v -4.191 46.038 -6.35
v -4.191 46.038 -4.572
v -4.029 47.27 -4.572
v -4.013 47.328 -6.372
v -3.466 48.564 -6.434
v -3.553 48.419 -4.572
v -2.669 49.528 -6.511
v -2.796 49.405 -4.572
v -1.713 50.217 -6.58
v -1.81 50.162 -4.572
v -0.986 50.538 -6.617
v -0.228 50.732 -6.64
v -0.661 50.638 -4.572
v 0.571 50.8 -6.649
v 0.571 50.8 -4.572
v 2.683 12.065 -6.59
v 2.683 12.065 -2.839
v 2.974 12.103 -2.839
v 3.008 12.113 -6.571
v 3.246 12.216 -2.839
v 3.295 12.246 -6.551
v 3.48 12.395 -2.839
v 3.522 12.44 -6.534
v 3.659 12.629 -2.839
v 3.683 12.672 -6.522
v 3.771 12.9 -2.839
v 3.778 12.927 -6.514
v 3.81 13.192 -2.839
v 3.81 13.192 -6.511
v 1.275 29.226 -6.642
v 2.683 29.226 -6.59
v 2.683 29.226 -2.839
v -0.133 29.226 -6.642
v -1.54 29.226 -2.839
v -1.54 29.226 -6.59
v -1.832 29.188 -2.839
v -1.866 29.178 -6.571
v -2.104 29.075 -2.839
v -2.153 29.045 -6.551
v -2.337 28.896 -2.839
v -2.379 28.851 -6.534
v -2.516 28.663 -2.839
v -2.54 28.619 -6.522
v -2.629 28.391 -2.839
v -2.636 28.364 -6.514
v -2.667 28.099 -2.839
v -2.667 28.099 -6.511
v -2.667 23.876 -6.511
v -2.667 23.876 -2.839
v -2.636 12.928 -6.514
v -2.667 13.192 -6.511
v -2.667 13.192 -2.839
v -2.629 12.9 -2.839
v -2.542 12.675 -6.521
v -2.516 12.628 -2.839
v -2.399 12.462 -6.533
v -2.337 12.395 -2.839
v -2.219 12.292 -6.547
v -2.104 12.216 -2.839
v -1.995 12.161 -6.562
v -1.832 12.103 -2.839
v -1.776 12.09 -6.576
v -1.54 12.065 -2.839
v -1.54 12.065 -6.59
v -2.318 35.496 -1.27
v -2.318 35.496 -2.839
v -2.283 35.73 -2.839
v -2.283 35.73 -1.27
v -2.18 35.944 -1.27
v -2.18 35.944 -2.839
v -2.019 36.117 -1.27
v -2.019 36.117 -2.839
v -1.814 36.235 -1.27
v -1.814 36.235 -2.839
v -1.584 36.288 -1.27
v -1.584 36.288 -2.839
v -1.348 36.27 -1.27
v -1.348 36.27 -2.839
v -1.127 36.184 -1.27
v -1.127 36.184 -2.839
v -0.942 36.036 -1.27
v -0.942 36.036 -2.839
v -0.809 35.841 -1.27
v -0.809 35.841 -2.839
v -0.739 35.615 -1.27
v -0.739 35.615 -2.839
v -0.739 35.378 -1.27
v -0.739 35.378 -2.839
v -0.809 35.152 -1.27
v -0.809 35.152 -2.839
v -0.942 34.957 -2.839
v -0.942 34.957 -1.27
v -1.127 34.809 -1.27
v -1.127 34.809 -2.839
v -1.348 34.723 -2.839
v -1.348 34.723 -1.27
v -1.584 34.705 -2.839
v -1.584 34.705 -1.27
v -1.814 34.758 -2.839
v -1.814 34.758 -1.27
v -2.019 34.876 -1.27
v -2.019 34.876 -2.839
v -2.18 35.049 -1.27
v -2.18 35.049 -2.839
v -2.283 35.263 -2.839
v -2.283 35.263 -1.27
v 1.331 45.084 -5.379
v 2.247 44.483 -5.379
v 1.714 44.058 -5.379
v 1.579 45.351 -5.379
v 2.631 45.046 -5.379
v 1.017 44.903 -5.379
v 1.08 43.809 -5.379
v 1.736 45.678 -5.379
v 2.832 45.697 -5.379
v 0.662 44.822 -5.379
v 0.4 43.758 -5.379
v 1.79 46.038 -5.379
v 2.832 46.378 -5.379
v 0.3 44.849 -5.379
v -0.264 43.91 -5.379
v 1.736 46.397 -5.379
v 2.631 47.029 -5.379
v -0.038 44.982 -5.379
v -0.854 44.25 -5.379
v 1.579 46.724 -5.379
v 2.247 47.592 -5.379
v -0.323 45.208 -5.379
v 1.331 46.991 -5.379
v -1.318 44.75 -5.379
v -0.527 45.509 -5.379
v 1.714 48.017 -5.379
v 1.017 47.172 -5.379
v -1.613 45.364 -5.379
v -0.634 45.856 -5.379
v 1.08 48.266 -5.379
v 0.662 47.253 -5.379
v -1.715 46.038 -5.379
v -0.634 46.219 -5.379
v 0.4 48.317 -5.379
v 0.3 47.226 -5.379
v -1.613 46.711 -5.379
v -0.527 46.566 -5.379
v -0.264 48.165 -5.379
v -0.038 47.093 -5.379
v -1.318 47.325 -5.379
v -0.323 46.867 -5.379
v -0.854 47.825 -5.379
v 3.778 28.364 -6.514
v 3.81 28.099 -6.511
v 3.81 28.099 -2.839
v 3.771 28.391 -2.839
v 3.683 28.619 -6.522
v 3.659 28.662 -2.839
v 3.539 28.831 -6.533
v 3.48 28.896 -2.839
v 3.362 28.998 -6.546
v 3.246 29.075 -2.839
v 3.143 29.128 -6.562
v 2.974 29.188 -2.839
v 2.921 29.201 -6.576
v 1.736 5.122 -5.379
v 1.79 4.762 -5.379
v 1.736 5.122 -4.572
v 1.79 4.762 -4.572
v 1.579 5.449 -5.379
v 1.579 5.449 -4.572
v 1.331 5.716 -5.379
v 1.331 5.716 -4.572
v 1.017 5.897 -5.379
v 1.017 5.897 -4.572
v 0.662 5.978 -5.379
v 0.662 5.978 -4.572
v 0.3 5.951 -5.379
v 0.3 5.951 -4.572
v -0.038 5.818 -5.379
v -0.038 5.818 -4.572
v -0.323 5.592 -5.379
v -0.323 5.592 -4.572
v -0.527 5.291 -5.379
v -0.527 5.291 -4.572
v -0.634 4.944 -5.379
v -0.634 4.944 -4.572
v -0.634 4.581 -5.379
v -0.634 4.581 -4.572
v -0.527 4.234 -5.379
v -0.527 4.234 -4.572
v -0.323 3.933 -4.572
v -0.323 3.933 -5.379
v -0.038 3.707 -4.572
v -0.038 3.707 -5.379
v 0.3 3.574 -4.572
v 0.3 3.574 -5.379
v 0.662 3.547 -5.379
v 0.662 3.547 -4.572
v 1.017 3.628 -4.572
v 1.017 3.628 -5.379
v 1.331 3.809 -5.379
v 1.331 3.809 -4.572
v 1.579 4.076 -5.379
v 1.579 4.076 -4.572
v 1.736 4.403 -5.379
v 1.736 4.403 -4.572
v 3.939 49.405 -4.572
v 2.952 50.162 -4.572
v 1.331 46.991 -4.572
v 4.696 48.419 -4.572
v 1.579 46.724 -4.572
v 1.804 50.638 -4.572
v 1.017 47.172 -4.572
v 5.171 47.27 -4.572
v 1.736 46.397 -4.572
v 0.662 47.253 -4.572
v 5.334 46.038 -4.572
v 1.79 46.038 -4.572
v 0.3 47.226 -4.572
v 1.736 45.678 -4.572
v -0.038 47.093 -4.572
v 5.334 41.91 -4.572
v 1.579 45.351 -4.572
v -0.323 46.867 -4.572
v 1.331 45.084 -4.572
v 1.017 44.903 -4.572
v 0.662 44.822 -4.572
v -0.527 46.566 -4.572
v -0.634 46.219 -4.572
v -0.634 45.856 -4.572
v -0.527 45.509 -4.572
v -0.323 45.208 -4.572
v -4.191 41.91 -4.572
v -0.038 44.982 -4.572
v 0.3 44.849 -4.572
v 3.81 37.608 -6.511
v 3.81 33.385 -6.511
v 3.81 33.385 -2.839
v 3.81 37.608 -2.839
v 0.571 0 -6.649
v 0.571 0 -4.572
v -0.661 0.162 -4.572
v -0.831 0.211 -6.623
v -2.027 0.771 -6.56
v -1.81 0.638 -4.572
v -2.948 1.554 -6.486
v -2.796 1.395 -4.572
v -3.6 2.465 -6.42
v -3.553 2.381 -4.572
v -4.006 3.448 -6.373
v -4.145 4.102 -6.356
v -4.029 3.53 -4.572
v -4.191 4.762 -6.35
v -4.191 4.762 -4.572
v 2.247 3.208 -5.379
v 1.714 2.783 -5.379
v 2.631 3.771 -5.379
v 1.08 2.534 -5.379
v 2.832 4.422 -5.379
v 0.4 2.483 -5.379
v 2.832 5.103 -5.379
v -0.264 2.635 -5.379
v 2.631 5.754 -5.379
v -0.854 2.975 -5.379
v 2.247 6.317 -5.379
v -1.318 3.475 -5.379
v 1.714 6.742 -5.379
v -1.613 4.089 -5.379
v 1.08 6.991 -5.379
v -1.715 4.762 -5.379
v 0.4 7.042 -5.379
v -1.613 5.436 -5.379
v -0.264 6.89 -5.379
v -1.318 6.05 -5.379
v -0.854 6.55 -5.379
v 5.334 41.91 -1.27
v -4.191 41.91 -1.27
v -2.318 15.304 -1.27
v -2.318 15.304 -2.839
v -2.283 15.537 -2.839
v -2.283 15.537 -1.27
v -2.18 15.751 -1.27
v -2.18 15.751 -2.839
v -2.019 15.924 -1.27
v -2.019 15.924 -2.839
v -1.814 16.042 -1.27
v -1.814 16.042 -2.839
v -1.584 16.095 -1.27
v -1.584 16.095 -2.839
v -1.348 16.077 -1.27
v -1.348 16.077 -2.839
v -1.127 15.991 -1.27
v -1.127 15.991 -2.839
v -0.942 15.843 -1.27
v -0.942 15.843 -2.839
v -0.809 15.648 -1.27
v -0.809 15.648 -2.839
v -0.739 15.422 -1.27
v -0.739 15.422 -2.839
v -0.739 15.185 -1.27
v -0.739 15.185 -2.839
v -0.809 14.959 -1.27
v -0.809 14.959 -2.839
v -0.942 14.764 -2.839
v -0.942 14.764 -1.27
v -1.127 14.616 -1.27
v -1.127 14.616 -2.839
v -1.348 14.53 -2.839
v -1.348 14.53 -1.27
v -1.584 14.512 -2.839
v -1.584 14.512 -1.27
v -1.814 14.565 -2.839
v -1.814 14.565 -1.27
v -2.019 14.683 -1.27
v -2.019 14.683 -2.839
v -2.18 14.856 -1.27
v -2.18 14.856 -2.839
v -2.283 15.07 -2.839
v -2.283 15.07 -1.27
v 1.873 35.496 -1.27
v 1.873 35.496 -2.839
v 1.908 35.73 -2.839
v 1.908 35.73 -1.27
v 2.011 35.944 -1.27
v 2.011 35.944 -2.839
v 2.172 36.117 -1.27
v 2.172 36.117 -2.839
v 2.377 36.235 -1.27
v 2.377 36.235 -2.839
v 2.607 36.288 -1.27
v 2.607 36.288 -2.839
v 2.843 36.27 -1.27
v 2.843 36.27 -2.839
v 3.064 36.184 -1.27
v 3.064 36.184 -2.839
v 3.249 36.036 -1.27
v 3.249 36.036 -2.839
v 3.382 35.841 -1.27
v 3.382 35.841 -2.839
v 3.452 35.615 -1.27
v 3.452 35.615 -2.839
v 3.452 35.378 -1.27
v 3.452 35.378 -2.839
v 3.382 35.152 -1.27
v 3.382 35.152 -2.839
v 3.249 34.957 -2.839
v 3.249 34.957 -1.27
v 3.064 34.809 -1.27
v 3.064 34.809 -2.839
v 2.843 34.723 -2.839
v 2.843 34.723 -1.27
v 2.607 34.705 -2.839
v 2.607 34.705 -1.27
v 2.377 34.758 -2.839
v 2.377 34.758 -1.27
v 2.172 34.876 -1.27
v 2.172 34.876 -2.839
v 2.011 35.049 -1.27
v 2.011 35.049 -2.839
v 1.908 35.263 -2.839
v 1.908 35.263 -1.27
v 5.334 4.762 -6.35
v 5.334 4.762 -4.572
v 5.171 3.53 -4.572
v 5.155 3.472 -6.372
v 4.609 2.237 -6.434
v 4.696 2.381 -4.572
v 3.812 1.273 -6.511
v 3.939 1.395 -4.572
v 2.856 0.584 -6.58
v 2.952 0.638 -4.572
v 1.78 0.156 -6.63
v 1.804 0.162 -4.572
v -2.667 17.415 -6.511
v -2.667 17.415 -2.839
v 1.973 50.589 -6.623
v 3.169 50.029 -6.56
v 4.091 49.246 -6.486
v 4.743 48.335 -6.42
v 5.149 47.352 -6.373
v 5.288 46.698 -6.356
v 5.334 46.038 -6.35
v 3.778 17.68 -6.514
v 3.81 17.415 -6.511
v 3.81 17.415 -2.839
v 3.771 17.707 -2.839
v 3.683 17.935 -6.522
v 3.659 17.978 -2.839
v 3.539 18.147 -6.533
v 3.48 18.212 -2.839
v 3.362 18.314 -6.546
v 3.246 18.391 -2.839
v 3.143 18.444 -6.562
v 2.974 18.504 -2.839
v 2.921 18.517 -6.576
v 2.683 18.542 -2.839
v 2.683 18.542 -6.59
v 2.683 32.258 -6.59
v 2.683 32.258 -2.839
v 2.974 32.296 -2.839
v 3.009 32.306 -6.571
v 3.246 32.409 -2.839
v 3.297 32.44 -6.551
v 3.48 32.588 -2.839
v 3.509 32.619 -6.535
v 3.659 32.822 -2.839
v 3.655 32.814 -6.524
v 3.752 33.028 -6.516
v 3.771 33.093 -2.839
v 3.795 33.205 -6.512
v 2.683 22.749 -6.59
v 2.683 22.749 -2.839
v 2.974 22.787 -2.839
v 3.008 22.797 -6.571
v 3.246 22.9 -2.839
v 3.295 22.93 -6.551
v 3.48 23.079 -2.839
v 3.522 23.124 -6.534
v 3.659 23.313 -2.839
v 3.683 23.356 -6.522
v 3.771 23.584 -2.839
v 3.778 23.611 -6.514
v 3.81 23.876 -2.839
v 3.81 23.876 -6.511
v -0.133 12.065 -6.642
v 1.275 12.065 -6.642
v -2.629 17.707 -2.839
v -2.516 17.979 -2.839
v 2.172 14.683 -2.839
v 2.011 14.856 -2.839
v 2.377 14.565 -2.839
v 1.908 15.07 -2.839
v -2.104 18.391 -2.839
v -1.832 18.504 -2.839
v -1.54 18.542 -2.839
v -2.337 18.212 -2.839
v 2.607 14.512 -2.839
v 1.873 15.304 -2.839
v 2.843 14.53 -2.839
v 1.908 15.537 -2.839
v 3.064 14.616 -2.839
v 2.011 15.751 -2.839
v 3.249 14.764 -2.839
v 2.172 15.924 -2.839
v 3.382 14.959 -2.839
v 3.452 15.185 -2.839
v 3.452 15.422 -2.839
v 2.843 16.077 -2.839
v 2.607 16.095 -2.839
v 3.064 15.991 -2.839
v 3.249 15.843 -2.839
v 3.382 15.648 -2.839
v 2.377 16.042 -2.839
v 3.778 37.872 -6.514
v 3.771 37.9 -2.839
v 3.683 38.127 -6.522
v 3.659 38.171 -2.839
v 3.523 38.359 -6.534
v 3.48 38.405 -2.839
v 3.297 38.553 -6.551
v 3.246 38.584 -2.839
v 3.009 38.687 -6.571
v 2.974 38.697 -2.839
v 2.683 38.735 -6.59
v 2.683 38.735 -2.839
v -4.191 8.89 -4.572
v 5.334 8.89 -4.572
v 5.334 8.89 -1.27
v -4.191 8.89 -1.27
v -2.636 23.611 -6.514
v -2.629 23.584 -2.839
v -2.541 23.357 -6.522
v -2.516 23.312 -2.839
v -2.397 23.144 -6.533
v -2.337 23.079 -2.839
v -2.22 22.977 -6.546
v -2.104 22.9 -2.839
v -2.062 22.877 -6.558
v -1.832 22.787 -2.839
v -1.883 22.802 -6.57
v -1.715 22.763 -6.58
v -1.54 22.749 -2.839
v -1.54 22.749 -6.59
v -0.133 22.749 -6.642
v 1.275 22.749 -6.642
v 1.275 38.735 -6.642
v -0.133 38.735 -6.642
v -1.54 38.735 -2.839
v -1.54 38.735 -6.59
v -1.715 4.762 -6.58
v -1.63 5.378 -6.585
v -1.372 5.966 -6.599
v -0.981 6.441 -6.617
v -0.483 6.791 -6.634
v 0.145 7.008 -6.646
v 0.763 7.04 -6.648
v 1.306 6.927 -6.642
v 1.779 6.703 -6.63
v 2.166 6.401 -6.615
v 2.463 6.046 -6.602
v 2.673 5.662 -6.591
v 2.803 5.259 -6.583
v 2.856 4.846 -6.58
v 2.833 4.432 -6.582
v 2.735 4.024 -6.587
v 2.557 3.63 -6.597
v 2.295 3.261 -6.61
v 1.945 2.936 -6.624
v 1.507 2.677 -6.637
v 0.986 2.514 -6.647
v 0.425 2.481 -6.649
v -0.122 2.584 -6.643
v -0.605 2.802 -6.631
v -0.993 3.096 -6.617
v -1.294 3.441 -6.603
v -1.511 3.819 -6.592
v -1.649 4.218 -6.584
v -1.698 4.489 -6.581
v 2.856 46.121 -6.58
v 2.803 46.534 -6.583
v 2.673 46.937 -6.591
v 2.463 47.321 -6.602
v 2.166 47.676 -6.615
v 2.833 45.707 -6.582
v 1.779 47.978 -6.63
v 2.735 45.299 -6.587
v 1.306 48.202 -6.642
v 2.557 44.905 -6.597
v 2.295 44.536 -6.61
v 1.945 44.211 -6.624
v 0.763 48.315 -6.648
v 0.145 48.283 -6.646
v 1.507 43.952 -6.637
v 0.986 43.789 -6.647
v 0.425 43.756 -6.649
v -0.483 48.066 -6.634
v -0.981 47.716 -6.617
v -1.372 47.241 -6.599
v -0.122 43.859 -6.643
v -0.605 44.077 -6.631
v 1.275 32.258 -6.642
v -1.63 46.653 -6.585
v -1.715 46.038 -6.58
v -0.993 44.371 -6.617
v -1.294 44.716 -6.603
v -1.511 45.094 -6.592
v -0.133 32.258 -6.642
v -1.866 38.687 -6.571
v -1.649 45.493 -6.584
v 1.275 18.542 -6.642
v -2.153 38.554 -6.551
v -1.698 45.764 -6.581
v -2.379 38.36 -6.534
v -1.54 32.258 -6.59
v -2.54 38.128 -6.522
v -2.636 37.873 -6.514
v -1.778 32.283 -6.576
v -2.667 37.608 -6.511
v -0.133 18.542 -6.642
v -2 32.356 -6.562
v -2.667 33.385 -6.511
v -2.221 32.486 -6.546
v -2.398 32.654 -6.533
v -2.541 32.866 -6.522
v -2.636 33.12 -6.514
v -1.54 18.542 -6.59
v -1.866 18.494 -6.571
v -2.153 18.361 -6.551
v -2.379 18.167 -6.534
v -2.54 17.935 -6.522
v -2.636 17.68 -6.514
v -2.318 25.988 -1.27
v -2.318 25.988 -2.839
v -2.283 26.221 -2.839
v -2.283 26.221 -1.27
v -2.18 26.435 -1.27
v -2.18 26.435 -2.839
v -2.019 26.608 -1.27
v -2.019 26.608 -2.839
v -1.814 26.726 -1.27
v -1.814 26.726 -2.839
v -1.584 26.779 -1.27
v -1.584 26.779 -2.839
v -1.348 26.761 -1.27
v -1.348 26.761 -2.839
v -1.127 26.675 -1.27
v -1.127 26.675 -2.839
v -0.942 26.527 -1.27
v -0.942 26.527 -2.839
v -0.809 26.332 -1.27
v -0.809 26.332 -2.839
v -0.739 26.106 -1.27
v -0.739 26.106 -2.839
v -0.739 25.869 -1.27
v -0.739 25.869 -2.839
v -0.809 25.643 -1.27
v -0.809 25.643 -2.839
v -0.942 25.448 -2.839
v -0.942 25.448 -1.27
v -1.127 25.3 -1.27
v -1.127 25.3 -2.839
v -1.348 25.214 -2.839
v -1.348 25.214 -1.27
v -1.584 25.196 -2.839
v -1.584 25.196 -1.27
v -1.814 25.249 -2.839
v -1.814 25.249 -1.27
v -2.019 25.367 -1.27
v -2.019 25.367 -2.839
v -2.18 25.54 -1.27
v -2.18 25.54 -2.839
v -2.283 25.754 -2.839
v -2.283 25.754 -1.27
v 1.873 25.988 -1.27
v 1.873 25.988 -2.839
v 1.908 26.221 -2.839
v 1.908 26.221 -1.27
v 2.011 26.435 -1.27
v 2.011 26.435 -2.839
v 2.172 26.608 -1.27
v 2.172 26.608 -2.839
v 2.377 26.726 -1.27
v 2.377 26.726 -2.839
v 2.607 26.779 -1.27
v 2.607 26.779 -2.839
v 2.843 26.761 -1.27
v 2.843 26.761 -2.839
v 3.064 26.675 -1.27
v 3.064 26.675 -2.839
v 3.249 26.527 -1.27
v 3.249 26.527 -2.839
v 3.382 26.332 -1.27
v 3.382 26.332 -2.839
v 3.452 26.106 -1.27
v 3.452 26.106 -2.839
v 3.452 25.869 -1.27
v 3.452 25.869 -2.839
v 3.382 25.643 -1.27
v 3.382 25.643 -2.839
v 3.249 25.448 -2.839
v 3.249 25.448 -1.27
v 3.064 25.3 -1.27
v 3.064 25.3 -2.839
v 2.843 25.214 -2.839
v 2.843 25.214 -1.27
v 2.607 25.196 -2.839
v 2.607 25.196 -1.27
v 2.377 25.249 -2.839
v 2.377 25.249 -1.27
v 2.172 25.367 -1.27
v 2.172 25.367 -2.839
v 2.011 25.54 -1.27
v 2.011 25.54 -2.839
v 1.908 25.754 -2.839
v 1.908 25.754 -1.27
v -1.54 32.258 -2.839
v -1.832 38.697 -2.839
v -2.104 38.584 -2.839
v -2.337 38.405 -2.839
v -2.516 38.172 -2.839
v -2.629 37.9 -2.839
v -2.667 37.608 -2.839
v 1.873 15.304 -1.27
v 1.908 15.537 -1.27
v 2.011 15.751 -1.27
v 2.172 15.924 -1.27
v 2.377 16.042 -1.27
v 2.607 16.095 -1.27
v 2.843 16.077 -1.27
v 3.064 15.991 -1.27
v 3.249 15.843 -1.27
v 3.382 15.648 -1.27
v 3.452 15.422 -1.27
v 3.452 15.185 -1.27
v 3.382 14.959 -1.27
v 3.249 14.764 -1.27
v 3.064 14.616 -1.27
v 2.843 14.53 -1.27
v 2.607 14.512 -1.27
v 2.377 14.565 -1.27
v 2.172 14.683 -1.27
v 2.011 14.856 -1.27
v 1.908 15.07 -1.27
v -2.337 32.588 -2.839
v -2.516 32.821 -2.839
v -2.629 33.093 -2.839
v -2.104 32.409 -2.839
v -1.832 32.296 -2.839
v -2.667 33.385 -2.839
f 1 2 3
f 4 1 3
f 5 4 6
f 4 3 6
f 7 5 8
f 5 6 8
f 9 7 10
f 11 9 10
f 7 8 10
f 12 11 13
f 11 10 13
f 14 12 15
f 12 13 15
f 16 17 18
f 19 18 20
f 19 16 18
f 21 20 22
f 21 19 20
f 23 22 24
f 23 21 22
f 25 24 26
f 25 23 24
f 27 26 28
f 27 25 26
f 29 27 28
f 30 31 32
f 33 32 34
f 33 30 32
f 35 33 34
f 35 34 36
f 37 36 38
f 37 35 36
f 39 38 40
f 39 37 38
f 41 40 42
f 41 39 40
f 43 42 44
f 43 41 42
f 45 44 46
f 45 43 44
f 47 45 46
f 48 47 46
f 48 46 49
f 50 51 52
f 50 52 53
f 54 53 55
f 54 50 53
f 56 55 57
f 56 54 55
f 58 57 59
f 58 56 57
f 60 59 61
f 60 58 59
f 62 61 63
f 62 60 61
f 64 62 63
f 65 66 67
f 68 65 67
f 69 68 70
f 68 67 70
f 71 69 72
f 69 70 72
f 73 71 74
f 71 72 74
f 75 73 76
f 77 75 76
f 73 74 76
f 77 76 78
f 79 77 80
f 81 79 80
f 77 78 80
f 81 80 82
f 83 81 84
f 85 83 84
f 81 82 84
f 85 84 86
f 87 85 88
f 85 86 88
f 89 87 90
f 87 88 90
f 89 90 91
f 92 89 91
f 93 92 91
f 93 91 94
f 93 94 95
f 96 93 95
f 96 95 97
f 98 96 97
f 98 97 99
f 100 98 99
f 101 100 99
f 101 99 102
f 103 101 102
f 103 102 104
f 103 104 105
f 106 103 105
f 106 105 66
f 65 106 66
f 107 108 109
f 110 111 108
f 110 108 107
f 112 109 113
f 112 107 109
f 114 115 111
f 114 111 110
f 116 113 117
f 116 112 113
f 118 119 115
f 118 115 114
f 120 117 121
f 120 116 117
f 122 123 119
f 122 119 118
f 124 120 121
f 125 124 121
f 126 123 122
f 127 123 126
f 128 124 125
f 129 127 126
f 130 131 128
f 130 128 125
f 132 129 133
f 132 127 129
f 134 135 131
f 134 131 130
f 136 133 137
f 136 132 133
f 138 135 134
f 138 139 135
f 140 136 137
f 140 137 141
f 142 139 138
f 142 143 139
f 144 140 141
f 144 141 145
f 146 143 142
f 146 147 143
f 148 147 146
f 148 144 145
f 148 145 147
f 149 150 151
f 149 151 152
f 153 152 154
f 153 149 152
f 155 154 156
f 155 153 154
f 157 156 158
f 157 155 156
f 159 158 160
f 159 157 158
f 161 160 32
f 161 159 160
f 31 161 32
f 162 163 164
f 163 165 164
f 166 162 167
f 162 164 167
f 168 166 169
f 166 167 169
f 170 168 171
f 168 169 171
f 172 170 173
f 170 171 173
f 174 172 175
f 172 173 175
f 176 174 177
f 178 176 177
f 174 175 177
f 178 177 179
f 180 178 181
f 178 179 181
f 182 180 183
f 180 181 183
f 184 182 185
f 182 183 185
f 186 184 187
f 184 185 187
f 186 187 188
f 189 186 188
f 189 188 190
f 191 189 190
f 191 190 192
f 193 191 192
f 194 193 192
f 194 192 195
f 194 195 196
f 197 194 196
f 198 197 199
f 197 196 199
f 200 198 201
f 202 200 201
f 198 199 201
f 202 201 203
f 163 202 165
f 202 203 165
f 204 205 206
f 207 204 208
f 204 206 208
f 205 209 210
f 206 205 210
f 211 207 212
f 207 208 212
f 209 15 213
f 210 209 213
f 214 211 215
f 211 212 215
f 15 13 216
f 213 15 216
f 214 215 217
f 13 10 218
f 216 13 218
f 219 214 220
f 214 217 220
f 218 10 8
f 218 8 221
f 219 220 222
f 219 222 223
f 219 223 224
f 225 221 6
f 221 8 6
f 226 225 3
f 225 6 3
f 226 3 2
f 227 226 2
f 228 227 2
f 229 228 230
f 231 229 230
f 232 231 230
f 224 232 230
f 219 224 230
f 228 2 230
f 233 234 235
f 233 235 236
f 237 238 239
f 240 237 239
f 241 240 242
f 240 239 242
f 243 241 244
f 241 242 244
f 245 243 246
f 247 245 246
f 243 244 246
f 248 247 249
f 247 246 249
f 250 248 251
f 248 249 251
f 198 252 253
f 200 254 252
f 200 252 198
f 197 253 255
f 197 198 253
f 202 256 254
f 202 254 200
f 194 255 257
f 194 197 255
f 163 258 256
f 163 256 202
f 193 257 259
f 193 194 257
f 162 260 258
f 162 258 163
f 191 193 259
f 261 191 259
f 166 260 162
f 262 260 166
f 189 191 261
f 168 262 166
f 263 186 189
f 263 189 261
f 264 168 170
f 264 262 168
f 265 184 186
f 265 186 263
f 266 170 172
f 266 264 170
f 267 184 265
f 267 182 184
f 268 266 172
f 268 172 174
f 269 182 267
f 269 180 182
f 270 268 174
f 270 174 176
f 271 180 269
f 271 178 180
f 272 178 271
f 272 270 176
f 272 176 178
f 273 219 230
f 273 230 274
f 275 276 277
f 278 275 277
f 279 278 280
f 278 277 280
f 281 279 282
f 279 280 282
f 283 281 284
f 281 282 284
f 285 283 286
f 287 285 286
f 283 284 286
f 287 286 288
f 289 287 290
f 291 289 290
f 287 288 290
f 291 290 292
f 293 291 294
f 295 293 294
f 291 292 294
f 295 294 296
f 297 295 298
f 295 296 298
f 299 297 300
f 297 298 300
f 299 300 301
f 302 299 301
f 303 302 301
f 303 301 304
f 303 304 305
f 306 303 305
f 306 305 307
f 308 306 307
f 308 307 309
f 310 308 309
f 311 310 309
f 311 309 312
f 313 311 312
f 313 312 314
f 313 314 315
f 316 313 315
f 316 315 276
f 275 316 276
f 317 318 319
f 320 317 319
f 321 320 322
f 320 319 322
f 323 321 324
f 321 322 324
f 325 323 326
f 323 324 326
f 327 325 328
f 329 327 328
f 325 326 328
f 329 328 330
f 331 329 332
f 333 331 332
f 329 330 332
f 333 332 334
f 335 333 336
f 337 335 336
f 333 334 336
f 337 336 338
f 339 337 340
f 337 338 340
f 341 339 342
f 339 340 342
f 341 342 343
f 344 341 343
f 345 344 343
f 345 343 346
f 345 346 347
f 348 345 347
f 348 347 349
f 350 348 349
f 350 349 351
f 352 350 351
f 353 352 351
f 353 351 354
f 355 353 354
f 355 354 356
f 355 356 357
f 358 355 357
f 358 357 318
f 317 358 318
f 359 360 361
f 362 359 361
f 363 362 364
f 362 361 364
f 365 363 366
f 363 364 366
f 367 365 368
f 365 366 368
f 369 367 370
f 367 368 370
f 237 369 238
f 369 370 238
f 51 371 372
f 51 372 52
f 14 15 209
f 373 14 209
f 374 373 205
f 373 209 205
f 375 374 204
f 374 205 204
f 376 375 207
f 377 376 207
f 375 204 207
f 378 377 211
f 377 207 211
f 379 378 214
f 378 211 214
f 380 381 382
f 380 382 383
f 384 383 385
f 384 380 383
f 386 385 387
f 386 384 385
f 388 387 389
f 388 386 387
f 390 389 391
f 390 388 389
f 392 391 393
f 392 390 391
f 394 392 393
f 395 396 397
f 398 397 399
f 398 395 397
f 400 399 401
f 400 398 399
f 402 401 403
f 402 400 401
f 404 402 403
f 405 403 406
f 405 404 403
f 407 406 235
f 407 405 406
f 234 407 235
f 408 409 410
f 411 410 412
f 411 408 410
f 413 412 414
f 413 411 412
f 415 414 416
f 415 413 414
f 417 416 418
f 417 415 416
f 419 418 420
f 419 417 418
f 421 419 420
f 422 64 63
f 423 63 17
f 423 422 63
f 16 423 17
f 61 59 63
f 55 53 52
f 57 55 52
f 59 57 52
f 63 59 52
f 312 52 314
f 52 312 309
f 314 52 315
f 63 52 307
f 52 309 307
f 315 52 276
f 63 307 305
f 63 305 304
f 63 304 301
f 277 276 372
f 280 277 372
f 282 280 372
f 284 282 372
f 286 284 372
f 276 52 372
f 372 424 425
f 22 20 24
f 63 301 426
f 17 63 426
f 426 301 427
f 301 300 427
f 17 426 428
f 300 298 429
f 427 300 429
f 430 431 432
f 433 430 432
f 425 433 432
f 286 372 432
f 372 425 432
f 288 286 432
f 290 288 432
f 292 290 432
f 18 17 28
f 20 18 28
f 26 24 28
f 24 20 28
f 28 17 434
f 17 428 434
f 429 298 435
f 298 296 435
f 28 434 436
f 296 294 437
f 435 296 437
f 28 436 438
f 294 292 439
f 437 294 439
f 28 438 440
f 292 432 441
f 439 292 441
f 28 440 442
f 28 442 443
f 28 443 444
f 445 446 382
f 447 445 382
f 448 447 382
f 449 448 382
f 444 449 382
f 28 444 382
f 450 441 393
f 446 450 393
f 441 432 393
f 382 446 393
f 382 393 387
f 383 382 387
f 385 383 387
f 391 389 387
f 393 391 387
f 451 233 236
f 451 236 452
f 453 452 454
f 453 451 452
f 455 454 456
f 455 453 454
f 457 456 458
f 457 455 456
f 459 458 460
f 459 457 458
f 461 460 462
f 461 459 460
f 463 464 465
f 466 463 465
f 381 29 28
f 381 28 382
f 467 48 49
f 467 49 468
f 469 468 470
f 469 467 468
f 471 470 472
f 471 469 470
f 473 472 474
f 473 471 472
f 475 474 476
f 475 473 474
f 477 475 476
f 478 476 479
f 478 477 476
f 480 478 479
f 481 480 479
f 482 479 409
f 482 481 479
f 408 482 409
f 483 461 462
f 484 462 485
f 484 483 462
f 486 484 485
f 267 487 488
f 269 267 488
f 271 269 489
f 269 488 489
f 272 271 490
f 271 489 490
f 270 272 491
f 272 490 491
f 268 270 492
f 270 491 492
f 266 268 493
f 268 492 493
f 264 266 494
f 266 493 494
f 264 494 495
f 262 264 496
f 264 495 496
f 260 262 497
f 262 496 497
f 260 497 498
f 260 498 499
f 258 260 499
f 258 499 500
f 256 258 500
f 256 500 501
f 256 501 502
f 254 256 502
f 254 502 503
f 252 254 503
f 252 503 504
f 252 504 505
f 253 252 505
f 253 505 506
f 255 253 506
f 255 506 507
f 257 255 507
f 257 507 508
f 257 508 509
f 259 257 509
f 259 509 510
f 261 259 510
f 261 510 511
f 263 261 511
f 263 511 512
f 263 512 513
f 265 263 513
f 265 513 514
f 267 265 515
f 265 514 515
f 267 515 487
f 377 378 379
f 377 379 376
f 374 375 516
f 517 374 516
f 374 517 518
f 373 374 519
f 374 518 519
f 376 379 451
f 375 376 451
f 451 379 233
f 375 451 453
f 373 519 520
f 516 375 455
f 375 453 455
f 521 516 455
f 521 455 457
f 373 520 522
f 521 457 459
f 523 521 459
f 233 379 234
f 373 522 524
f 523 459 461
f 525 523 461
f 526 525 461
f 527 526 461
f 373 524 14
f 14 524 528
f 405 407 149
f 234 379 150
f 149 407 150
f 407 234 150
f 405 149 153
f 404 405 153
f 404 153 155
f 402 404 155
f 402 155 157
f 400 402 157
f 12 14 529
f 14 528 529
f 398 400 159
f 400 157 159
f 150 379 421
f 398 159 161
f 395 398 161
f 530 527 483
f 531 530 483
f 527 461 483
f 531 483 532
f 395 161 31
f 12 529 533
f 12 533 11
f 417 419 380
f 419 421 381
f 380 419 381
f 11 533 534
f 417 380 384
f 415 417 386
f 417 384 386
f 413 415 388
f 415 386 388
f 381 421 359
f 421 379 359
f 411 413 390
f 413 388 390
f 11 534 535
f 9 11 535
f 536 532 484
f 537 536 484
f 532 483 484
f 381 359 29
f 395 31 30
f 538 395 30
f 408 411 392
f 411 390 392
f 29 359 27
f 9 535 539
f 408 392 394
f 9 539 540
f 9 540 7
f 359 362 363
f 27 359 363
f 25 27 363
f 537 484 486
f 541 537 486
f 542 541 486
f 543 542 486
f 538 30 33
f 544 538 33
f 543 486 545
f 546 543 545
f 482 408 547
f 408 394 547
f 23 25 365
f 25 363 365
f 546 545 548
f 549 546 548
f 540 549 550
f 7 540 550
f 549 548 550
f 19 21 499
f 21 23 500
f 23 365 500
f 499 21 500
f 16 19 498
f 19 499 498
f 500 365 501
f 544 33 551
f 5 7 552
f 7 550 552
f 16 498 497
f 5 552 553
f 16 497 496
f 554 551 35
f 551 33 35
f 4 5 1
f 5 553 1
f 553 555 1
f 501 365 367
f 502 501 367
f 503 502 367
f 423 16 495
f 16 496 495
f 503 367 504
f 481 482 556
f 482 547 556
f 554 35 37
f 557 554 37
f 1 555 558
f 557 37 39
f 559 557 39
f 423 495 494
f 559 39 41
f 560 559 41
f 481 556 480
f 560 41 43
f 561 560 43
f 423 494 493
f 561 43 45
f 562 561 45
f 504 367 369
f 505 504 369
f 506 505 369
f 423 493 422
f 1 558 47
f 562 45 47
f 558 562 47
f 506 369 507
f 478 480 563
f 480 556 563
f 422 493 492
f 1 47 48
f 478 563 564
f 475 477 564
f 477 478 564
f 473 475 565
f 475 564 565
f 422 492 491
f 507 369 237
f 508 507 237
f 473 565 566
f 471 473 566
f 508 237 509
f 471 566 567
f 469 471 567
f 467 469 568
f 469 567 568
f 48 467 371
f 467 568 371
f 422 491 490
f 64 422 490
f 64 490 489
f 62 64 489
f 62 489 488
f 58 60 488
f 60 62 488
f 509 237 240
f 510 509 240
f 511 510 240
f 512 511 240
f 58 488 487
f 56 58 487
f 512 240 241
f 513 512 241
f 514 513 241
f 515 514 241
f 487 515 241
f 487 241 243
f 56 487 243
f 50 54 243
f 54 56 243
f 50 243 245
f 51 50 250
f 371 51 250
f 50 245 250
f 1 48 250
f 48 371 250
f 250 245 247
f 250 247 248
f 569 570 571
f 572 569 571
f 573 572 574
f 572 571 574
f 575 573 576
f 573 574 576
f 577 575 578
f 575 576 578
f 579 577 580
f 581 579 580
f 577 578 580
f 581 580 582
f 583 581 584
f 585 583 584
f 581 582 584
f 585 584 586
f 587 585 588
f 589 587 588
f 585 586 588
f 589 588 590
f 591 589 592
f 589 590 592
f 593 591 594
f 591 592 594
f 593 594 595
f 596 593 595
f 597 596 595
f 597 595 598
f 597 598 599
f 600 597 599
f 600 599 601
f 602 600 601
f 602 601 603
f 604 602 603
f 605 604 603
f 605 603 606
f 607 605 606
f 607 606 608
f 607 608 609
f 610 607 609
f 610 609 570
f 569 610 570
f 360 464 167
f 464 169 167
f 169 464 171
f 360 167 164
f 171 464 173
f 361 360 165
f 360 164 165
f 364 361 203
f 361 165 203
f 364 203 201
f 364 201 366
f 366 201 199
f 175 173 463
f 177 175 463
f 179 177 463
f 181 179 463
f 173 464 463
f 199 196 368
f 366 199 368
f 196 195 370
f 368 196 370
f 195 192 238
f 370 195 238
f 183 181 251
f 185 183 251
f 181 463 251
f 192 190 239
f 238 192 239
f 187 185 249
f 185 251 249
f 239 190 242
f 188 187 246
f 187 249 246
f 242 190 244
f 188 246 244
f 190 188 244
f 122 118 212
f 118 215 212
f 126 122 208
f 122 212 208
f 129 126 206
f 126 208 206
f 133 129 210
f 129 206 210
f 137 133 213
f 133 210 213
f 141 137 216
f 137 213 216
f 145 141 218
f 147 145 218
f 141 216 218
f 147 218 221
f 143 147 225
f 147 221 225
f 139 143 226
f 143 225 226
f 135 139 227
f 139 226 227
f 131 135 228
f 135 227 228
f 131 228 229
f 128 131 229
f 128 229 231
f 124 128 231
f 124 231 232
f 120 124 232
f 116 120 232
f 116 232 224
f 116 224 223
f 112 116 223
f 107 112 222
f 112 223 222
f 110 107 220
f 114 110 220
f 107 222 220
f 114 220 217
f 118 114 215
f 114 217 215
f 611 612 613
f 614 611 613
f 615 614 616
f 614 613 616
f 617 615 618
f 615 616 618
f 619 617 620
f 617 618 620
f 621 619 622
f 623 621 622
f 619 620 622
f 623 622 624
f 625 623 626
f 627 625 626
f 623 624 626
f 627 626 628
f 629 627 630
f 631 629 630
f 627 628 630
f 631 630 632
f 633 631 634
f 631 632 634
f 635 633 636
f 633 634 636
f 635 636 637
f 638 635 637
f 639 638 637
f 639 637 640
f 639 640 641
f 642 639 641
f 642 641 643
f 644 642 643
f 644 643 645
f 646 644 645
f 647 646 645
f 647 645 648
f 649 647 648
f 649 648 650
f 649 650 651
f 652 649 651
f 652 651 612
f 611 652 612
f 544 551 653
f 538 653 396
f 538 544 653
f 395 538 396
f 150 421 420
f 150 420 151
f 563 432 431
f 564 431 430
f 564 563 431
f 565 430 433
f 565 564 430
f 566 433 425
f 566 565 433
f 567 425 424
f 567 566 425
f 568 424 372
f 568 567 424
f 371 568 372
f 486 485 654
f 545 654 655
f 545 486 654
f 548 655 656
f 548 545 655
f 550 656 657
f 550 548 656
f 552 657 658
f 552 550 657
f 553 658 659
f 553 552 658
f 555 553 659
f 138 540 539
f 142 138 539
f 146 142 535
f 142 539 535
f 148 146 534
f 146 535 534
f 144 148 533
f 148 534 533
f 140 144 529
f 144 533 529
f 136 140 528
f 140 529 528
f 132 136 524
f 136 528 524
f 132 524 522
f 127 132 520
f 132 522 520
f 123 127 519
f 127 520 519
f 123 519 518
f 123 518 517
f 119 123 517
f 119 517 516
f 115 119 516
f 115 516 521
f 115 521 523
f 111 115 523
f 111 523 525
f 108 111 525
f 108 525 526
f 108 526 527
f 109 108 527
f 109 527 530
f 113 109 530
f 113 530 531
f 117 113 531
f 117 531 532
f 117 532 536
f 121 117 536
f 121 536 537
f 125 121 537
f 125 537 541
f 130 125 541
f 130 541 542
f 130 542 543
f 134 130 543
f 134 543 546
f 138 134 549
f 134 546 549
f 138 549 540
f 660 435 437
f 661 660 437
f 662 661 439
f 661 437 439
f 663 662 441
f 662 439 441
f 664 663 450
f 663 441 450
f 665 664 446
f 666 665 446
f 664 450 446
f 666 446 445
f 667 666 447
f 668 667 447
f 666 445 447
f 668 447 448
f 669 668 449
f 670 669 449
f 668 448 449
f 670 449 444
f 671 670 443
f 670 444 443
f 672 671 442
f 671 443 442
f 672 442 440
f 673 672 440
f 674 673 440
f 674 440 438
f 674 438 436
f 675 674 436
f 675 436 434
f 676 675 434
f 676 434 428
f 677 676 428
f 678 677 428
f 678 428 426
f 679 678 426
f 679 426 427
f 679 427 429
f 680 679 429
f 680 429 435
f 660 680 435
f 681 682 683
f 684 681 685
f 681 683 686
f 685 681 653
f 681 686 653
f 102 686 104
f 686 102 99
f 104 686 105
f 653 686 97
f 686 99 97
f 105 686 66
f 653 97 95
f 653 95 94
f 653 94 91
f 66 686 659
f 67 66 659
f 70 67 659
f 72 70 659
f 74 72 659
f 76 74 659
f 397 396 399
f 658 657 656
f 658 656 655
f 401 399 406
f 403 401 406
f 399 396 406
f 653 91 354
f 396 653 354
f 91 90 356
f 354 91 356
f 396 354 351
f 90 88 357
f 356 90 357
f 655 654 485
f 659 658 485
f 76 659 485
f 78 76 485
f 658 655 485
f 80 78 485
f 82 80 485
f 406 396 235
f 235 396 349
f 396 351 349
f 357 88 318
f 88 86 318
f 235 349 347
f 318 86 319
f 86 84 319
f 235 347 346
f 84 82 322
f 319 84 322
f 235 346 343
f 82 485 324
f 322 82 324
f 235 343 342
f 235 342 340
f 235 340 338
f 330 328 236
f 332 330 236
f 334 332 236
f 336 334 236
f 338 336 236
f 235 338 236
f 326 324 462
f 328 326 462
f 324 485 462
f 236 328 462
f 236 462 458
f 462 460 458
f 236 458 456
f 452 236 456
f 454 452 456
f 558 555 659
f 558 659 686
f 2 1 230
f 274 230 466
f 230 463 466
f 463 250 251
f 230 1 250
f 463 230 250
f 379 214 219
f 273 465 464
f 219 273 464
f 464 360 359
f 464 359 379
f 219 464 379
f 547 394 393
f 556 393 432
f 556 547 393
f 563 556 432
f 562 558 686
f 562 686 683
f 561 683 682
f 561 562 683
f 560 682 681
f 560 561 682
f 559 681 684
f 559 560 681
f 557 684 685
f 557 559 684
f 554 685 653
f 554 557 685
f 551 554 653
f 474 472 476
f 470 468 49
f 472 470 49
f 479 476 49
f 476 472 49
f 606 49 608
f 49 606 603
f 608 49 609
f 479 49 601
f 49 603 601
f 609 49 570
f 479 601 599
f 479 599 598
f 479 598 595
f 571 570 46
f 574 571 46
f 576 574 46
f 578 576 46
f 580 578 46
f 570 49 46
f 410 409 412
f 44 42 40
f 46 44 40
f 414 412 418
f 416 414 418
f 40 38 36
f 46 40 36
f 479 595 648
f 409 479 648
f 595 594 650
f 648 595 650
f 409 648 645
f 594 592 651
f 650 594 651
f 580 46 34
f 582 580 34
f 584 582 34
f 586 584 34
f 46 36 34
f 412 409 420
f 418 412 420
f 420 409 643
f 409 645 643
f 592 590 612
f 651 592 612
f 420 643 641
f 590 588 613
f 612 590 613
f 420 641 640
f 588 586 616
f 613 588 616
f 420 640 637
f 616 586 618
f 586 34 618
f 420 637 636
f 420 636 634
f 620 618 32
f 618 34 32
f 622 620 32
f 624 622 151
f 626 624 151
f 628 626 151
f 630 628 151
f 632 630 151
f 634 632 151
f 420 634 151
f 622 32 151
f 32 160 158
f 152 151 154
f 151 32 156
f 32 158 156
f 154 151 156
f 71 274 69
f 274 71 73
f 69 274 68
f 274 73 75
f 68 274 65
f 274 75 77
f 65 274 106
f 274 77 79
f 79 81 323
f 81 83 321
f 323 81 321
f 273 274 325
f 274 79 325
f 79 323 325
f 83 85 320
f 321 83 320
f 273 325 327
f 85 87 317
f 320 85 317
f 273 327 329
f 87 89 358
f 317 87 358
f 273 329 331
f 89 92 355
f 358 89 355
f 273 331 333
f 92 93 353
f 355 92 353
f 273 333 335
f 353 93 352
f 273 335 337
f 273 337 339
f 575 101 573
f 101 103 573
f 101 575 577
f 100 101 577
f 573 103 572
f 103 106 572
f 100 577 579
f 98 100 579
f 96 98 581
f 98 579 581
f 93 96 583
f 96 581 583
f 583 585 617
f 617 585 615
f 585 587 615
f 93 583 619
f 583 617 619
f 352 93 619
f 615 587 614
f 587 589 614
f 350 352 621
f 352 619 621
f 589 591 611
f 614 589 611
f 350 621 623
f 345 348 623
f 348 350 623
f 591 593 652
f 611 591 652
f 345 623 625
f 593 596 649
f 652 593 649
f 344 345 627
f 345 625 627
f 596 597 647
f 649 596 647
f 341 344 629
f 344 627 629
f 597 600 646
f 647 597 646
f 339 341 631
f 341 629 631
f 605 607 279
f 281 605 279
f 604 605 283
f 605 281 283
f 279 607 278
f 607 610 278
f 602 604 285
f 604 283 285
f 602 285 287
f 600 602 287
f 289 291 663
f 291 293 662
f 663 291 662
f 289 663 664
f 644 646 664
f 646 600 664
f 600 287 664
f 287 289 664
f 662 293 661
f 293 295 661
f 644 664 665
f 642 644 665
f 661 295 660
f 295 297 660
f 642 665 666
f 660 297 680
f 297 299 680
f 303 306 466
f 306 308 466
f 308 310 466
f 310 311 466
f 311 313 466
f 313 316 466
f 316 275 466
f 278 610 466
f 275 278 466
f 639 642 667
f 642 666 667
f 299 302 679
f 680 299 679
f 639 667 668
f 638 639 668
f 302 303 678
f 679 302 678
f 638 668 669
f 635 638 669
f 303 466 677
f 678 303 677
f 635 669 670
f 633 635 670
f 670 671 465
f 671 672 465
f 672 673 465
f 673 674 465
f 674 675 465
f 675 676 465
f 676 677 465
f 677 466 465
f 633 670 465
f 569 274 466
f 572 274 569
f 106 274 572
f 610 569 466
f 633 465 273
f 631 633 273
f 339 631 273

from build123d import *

# Parameters (mm, degrees)
MAIN_PROFILE_DEPTH                             = 50.8
END_ROUNDS_DEPTH                               = 25.4
SKETCH3_W                                      = 3.302
SKETCH3_H                                      = 4.7625
SKETCH3_H_2                                    = 4.1275
LOCATING_FLANGE_DEPTH                          = 53.111155755
BUTTON_POCKETS_DEPTH                           = 3.81
CBORE_FOR_2_SOCKET_HEAD_CAP_SCREW1_D           = 2.4384
CBORE_FOR_2_SOCKET_HEAD_CAP_SCREW1_CBORE_D     = 4.572
CBORE_FOR_2_SOCKET_HEAD_CAP_SCREW1_CBORE_DEPTH = 1.27
F_1_16_0_0625_DIAMETER_HOLE1_D                 = 1.5875


with BuildPart() as part:
    # Sketch1 → Main profile (new body)
    with BuildSketch(Plane(origin=(0, 0, 0), x_dir=(1, 0, 0), z_dir=(0, 1, 0))):
        with BuildLine():
            Line((-4.191328185, 1.27), (5.333671815, 1.27))
            Line((5.333671815, 1.27), (5.333671815, 6.35))
            ThreePointArc((5.333671815, 6.35), (0.571171815, 6.648828143), (-4.191328185, 6.35))
            Line((-4.191328185, 6.35), (-4.191328185, 1.27))
        make_face()
    extrude(amount=MAIN_PROFILE_DEPTH)

    # Sketch2 → End rounds (cut)
    with BuildSketch(Plane.XY.offset(-1.27)):
        with BuildLine():
            Line((-4.191328185, 50.8), (-4.191328185, 46.0375))
            ThreePointArc((-4.191328185, 46.0375), (-2.796424231, 49.405096045), (0.571171815, 50.8))
            Line((0.571171815, 50.8), (-4.191328185, 50.8))
        make_face()
        with BuildLine():
            Line((5.333671815, 50.8), (0.571171815, 50.8))
            ThreePointArc((0.571171815, 50.8), (3.93876786, 49.405096045), (5.333671815, 46.0375))
            Line((5.333671815, 46.0375), (5.333671815, 50.8))
        make_face()
        with BuildLine():
            ThreePointArc((5.333671815, 4.7625), (3.938767861, 1.394903955), (0.571171817, 0))
            Line((0.571171817, 0), (5.333671815, 0))
            Line((5.333671815, 0), (5.333671815, 4.7625))
        make_face()
        with BuildLine():
            ThreePointArc((0.571171817, 0), (-2.79642423, 1.394903954), (-4.191328185, 4.7625))
            Line((-4.191328185, 4.7625), (-4.191328185, 0))
            Line((-4.191328185, 0), (0.571171817, 0))
        make_face()
    extrude(amount=-END_ROUNDS_DEPTH, mode=Mode.SUBTRACT)

    # Sketch3 → Locating Flange (cut, through all)
    with BuildSketch(Plane.ZY.offset(4.191328185)):
        with Locations((-2.921, 2.38125)):
            Rectangle(SKETCH3_W, SKETCH3_H)
        with Locations((-2.921, 6.82625)):
            Rectangle(SKETCH3_W, SKETCH3_H_2)
        with Locations((-2.921, 43.97375)):
            Rectangle(SKETCH3_W, SKETCH3_H_2)
        with Locations((-2.921, 48.41875)):
            Rectangle(SKETCH3_W, SKETCH3_H)
    extrude(amount=-LOCATING_FLANGE_DEPTH, mode=Mode.SUBTRACT)

    # Sketch4 → Button Pockets (cut)
    with BuildSketch(Plane(origin=(0, 0, -6.648828143), x_dir=(-1, 0, 0), z_dir=(0, 0, -1))):
        with BuildLine():
            Line((-2.682671815, 38.735), (1.540328185, 38.735))
            ThreePointArc((1.540328185, 38.735), (2.337237528, 38.404909342), (2.667328185, 37.608))
            Line((2.667328185, 37.608), (2.667328185, 33.385))
            ThreePointArc((2.667328185, 33.385), (2.337237528, 32.588090658), (1.540328185, 32.258))
            Line((1.540328185, 32.258), (-2.682671815, 32.258))
            ThreePointArc((-2.682671815, 32.258), (-3.479581157, 32.588090658), (-3.809671815, 33.385))
            Line((-3.809671815, 33.385), (-3.809671815, 37.608))
            ThreePointArc((-3.809671815, 37.608), (-3.479581157, 38.404909342), (-2.682671815, 38.735))
        make_face()
        with BuildLine():
            Line((-2.682671815, 29.226), (1.540328185, 29.226))
            ThreePointArc((1.540328185, 29.226), (2.337237528, 28.895909342), (2.667328185, 28.099))
            Line((2.667328185, 28.099), (2.667328185, 23.876))
            ThreePointArc((2.667328185, 23.876), (2.337237528, 23.079090658), (1.540328185, 22.749))
            Line((1.540328185, 22.749), (-2.682671815, 22.749))
            ThreePointArc((-2.682671815, 22.749), (-3.479581157, 23.079090658), (-3.809671815, 23.876))
            Line((-3.809671815, 23.876), (-3.809671815, 28.099))
            ThreePointArc((-3.809671815, 28.099), (-3.479581157, 28.895909342), (-2.682671815, 29.226))
        make_face()
        with BuildLine():
            Line((-2.682671815, 18.542), (1.540328185, 18.542))
            ThreePointArc((1.540328185, 18.542), (2.337237528, 18.211909342), (2.667328185, 17.415))
            Line((2.667328185, 17.415), (2.667328185, 13.192))
            ThreePointArc((2.667328185, 13.192), (2.337237528, 12.395090658), (1.540328185, 12.065))
            Line((1.540328185, 12.065), (-2.682671815, 12.065))
            ThreePointArc((-2.682671815, 12.065), (-3.479581157, 12.395090658), (-3.809671815, 13.192))
            Line((-3.809671815, 13.192), (-3.809671815, 17.415))
            ThreePointArc((-3.809671815, 17.415), (-3.479581157, 18.211909342), (-2.682671815, 18.542))
        make_face()
    extrude(amount=-BUTTON_POCKETS_DEPTH, mode=Mode.SUBTRACT)

    # CBORE for #2 Socket Head Cap Screw1 (through all)
    with Locations(Plane(origin=(0, 0, -6.648828143), x_dir=(-1, 0, 0), z_dir=(0, 0, -1))):
        with Locations((-0.571171815, 46.0375), (-0.571171815, 4.7625)):
            CounterBoreHole(CBORE_FOR_2_SOCKET_HEAD_CAP_SCREW1_D / 2, CBORE_FOR_2_SOCKET_HEAD_CAP_SCREW1_CBORE_D / 2, CBORE_FOR_2_SOCKET_HEAD_CAP_SCREW1_CBORE_DEPTH)

    # 1/16 (0.0625) Diameter Hole1 (through all)
    with Locations(Plane.XY.offset(-1.27)):
        with Locations((-1.524328185, 35.4965), (2.666671815, 35.4965), (2.666671815, 25.9875), (-1.524328185, 25.9875), (-1.524328185, 15.3035), (2.666671815, 15.3035)):
            Hole(F_1_16_0_0625_DIAMETER_HOLE1_D / 2)


solid = part.part
